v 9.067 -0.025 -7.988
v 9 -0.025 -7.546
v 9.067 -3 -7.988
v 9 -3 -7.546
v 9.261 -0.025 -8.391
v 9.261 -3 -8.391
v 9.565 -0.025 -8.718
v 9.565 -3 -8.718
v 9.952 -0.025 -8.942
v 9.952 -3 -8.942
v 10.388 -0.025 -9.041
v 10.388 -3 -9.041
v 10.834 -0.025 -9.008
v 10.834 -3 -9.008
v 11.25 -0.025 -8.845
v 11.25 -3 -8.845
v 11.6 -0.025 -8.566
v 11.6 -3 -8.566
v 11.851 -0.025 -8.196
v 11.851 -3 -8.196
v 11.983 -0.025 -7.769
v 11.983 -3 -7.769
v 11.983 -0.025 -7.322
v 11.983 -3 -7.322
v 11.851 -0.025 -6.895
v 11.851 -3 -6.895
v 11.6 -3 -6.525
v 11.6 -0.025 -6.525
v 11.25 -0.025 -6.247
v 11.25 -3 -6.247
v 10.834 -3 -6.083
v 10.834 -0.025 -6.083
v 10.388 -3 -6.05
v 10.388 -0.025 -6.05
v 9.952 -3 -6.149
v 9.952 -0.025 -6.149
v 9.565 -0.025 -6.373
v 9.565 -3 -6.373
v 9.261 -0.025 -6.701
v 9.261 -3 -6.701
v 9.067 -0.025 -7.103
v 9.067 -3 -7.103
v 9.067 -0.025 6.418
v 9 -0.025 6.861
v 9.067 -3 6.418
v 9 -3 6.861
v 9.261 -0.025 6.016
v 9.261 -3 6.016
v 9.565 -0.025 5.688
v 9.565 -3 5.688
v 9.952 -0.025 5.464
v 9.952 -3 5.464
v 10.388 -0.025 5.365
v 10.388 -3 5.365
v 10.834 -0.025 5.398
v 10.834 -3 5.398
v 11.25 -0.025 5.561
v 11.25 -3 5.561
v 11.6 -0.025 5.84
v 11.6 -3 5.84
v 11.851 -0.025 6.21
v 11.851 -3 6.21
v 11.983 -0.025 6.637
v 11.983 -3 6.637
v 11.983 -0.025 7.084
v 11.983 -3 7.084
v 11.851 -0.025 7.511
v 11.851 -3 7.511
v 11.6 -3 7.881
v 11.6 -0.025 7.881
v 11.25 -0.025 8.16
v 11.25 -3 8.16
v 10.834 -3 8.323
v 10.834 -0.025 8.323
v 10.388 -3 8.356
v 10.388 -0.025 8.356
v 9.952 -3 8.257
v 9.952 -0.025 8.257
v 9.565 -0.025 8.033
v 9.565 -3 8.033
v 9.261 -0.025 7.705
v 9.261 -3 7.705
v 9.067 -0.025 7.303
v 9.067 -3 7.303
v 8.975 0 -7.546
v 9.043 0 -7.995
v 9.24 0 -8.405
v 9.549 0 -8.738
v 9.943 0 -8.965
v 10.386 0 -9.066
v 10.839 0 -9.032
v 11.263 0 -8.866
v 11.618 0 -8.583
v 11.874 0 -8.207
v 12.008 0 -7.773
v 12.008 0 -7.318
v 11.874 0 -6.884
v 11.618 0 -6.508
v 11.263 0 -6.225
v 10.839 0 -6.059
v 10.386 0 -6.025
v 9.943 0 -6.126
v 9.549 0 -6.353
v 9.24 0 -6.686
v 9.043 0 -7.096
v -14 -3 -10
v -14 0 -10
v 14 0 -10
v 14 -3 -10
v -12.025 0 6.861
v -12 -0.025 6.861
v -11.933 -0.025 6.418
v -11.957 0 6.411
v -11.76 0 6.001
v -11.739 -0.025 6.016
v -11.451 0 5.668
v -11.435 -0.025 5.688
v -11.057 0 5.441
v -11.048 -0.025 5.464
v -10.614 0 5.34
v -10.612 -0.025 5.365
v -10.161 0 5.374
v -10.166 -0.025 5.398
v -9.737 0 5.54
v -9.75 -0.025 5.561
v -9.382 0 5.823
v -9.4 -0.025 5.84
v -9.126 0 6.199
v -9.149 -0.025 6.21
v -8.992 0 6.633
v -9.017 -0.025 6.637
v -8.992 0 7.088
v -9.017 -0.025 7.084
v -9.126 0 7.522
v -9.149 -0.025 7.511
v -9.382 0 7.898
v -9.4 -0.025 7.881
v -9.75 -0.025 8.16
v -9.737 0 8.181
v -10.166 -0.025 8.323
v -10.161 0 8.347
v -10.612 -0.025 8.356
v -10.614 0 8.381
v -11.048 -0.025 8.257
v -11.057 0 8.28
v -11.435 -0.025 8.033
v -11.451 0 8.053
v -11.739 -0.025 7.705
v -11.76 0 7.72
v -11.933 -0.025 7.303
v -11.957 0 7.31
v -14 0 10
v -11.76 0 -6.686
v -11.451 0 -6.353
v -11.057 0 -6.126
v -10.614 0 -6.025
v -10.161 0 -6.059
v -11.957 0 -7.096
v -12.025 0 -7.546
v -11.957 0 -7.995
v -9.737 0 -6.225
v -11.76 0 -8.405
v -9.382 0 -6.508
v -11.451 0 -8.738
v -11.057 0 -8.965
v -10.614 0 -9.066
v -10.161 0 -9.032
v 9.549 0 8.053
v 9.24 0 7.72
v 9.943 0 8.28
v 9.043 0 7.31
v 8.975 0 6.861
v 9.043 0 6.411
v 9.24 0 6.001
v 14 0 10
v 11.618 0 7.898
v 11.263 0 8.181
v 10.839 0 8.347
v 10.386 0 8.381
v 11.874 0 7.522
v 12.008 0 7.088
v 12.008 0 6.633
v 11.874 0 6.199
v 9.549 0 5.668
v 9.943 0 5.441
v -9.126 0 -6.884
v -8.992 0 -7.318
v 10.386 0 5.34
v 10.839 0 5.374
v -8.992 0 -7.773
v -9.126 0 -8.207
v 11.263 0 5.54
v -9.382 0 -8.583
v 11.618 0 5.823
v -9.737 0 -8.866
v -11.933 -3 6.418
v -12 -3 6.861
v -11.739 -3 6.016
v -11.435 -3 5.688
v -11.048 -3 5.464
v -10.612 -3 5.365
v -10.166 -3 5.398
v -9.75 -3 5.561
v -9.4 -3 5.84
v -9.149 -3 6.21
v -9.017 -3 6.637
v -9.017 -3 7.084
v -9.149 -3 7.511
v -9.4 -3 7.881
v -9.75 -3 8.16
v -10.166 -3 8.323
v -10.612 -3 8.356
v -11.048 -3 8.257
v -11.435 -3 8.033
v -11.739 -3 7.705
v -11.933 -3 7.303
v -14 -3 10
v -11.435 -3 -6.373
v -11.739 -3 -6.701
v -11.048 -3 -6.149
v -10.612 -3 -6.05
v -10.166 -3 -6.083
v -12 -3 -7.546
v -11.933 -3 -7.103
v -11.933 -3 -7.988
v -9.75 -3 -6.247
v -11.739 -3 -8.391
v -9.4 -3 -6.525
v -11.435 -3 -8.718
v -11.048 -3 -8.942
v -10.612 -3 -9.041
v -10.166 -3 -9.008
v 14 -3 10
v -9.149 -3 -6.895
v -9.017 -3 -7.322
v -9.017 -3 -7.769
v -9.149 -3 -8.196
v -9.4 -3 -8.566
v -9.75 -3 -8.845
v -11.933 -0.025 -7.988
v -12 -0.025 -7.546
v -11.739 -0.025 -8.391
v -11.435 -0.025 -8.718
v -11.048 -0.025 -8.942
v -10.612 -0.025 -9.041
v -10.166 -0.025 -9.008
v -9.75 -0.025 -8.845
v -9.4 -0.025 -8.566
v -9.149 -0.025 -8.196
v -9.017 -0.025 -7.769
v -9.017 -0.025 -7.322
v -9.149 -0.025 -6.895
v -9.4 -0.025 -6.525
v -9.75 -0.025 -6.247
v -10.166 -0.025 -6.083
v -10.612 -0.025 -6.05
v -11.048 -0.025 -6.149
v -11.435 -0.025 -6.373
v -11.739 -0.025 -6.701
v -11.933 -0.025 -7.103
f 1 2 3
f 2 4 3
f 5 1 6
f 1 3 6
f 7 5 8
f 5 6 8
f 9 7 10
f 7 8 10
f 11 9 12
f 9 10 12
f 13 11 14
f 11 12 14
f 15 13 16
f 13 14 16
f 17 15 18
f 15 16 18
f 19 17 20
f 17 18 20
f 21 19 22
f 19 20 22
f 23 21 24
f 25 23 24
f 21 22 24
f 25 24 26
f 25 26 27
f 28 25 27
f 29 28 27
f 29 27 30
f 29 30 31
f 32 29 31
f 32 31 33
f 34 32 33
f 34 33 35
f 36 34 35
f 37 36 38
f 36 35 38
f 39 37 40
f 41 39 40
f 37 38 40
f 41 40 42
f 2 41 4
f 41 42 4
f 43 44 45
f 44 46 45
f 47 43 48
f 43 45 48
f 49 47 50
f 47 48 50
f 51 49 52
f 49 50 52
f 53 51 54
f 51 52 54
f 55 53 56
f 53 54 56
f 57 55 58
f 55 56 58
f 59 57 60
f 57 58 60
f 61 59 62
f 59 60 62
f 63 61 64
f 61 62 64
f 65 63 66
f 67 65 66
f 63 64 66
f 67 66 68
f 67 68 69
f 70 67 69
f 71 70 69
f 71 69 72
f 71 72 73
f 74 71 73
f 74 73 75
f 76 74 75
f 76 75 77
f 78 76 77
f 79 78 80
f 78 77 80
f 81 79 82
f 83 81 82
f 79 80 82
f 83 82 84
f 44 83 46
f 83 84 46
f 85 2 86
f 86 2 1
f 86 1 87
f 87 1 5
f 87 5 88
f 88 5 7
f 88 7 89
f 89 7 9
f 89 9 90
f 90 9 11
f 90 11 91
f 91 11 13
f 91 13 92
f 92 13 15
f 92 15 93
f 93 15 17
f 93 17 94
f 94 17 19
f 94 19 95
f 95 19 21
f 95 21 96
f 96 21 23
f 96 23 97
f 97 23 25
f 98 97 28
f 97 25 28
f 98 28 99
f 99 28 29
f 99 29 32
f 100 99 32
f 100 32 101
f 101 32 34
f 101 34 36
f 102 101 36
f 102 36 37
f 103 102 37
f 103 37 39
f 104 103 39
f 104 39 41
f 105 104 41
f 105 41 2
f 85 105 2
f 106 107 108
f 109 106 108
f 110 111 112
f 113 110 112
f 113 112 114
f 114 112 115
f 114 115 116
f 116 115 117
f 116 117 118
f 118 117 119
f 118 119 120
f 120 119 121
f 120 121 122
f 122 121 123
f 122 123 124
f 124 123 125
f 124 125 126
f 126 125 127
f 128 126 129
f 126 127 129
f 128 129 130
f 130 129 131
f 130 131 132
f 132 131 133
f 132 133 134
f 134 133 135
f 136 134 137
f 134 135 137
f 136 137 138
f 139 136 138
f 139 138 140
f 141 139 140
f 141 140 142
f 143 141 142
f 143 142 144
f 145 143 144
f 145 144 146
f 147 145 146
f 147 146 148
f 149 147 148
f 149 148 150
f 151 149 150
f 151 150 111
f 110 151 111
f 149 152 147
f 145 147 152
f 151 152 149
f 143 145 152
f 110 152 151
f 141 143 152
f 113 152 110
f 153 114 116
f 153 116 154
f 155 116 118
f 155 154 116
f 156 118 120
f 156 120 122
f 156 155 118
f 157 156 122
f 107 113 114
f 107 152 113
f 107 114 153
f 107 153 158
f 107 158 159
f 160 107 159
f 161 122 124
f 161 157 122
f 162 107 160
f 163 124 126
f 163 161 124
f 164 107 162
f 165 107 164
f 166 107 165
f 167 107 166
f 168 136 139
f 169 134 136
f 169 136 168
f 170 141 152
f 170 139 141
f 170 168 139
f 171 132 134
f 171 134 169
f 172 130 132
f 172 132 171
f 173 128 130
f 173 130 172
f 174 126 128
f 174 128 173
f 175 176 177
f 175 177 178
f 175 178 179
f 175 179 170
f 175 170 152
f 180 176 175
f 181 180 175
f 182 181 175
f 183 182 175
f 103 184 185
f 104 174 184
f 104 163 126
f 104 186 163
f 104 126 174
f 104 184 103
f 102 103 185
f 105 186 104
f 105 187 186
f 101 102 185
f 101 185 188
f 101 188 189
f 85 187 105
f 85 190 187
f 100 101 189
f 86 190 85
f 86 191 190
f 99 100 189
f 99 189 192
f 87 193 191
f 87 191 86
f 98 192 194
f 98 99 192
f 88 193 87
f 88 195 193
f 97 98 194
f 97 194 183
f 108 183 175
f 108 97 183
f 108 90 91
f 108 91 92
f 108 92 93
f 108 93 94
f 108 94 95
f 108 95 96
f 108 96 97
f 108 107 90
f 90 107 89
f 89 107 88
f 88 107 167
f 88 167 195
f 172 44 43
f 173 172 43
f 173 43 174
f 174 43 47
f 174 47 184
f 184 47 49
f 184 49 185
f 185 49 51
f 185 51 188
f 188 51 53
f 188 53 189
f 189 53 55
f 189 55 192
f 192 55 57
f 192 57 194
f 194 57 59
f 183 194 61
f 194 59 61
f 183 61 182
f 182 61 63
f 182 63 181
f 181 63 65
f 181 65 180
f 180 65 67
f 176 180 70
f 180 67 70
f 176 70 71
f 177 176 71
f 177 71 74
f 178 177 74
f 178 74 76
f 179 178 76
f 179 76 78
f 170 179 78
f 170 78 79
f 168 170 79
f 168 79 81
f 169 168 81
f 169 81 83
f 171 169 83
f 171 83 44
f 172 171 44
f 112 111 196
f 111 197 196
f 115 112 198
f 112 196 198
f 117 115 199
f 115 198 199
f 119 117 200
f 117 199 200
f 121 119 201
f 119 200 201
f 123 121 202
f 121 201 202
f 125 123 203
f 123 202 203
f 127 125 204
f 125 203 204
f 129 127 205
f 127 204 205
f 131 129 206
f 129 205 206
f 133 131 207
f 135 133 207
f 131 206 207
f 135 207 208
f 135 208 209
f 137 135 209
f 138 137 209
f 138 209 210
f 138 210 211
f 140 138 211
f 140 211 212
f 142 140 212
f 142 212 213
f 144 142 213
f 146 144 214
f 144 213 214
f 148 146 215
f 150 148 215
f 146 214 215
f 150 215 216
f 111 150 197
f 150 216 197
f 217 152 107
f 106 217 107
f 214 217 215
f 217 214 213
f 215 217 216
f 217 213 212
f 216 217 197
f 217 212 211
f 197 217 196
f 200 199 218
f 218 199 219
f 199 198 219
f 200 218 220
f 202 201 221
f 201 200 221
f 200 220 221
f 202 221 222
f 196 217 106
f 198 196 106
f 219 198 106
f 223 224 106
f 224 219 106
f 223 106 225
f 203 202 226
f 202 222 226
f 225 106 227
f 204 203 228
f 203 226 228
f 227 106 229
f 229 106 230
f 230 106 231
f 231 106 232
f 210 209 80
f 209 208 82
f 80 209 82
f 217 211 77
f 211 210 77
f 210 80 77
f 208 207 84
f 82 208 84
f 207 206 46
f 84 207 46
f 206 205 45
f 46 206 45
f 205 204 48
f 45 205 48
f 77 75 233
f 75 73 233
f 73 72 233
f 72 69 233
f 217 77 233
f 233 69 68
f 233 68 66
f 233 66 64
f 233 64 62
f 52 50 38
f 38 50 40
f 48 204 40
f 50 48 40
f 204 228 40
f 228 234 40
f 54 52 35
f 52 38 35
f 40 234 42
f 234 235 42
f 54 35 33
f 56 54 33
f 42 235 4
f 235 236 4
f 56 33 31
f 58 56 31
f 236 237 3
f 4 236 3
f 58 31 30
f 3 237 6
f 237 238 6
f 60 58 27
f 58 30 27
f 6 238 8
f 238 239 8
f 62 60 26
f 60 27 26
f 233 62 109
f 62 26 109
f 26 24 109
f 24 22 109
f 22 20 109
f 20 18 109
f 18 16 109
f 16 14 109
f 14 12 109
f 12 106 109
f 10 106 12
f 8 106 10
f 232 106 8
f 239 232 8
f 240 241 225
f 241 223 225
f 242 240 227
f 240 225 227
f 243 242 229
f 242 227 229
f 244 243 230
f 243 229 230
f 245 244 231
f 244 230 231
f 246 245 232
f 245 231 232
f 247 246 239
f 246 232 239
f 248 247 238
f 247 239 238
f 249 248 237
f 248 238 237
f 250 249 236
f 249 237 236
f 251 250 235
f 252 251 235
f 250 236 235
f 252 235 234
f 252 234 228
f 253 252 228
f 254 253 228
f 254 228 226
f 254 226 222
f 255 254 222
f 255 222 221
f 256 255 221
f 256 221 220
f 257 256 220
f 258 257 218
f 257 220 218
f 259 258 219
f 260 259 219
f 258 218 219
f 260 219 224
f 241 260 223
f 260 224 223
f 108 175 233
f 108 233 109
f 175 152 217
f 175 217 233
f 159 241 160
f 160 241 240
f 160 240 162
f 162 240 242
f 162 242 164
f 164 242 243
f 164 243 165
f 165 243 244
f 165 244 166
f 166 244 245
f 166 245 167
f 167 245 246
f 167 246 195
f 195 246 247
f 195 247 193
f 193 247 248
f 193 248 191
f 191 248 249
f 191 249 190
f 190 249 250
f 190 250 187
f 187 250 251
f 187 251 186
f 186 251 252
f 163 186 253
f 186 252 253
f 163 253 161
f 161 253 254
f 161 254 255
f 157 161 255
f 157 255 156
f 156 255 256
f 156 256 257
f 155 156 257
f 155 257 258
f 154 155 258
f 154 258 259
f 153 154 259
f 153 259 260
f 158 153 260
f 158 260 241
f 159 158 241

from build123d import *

# Parameters (mm, degrees)
SKETCH1_W                          = 28
SKETCH1_H                          = 20
BOSS_EXTRUDE1_DEPTH                = 3
F_3_0_3_DIAMETER_HOLE7_D           = 3
F_3_0_3_DIAMETER_HOLE7_DEPTH       = 3
F_3_0_3_DIAMETER_HOLE7_CSINK_D     = 3.05
F_3_0_3_DIAMETER_HOLE7_CSINK_ANGLE = 90
F_3_0_3_DIAMETER_HOLE7_TIP         = 0.901290929


with BuildPart() as part:
    # Sketch1 → Boss-Extrude1 (new body)
    with BuildSketch(Plane(origin=(0, 0, 0), x_dir=(1, 0, 0), z_dir=(0, 1, 0))):
        Rectangle(SKETCH1_W, SKETCH1_H)
    extrude(amount=-BOSS_EXTRUDE1_DEPTH)

    # Ø3.0 (3) Diameter Hole7
    with Locations(Plane(origin=(0, 0, 0), x_dir=(1, 0, 0), z_dir=(0, 1, 0))):
        with Locations((-10.5, 7.545553469), (10.5, 7.545553469), (10.5, -6.860504487), (-10.5, -6.860504487)):
            CounterSinkHole(F_3_0_3_DIAMETER_HOLE7_D / 2, F_3_0_3_DIAMETER_HOLE7_CSINK_D / 2, depth=F_3_0_3_DIAMETER_HOLE7_DEPTH, counter_sink_angle=F_3_0_3_DIAMETER_HOLE7_CSINK_ANGLE)
            with Locations((0, 0, -(F_3_0_3_DIAMETER_HOLE7_DEPTH + F_3_0_3_DIAMETER_HOLE7_TIP / 2))):  # 118° drill point
                Cone(0, F_3_0_3_DIAMETER_HOLE7_D / 2, F_3_0_3_DIAMETER_HOLE7_TIP, mode=Mode.SUBTRACT)


solid = part.part
